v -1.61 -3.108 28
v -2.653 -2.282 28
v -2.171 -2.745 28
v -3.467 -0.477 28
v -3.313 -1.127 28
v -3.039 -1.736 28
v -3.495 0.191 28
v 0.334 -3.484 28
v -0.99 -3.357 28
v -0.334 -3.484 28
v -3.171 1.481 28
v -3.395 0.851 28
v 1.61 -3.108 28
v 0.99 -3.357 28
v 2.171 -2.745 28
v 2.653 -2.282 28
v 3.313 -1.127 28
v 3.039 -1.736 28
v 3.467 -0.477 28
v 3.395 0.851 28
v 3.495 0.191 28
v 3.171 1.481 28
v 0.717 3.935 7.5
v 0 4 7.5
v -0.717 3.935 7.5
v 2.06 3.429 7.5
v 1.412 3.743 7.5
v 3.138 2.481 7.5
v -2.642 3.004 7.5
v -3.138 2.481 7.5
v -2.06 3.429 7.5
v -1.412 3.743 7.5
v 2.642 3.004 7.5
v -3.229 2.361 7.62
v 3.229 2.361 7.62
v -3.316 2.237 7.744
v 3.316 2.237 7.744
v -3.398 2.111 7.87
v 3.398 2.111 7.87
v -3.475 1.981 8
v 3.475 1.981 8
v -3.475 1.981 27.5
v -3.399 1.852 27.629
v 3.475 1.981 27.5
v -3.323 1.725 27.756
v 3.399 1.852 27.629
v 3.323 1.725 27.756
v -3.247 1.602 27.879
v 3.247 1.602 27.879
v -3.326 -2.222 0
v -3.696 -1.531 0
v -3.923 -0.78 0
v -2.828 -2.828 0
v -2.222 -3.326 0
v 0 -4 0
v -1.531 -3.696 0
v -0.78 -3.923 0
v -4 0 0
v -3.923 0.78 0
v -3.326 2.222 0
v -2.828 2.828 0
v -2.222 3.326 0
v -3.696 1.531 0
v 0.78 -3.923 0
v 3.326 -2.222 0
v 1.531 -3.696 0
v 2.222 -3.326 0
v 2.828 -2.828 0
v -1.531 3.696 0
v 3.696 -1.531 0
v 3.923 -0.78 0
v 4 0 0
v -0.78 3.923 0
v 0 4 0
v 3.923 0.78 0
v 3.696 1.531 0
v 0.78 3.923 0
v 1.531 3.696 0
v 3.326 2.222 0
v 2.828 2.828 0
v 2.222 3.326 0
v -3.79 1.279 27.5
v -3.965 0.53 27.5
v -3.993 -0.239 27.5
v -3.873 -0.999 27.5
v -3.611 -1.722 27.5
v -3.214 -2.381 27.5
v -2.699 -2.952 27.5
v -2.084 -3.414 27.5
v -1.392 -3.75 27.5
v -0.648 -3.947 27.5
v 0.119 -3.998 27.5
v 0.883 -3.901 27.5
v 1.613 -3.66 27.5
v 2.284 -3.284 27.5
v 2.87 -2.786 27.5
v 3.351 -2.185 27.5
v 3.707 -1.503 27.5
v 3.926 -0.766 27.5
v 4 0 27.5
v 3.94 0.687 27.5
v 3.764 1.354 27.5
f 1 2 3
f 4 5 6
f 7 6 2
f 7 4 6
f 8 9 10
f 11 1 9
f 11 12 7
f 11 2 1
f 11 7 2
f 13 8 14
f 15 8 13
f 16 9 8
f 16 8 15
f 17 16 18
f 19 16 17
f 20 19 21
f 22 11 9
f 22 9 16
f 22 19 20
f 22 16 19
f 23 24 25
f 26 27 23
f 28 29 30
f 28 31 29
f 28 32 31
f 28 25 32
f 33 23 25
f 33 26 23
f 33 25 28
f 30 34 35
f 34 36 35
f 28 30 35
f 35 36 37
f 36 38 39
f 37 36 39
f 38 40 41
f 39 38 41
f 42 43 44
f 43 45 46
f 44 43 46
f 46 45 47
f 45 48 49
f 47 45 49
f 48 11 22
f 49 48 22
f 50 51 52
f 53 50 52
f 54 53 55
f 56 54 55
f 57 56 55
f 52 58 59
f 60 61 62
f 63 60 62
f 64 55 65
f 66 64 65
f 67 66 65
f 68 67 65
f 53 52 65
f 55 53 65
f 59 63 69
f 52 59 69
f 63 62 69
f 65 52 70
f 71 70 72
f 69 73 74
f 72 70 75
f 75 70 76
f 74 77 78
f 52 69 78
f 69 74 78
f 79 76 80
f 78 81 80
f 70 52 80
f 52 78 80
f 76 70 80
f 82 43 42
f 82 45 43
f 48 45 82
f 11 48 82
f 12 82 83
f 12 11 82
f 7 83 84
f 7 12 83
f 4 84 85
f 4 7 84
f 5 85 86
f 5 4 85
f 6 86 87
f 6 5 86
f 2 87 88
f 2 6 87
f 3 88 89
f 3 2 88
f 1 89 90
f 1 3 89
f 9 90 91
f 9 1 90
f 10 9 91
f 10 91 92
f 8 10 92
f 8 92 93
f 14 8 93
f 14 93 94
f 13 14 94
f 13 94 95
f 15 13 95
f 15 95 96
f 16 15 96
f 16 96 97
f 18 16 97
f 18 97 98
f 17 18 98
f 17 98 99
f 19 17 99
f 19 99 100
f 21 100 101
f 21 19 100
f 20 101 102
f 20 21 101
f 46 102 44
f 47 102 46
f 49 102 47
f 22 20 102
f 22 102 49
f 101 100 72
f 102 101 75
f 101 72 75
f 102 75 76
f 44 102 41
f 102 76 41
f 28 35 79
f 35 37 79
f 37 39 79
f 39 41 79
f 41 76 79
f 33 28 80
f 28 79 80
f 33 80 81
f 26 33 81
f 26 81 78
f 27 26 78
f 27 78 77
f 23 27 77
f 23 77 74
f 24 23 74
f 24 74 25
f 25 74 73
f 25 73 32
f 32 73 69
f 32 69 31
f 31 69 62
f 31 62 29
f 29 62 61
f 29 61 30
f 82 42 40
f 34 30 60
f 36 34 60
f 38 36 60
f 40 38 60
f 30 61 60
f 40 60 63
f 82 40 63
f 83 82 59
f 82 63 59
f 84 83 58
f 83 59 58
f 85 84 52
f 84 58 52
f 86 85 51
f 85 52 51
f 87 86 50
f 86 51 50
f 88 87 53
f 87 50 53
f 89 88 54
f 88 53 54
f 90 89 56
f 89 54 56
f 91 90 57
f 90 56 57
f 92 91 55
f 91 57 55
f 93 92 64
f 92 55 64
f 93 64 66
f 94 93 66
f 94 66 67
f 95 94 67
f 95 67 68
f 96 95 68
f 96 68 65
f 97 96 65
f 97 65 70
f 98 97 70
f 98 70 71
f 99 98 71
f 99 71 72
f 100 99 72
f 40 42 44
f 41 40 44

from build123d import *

# Parameters (mm, degrees)
SKETCH2_R           = 4
BOSS_EXTRUDE1_DEPTH = 28
CUT_EXTRUDE1_DEPTH  = 20.5
CHAMFER2_SIZE       = 0.5


with BuildPart() as part:
    # Sketch2 → Boss-Extrude1 (new body)
    with BuildSketch(Plane.XY):
        Circle(SKETCH2_R)
    extrude(amount=BOSS_EXTRUDE1_DEPTH)

    # Sketch4 → Cut-Extrude1 (cut)
    with BuildSketch(Plane.XY.offset(28)):
        Polygon((-3.475, 1.981003534), (3.475, 1.981003534), (3.475, 4), (0, 4), (-3.475, 4), align=None)
    extrude(amount=-CUT_EXTRUDE1_DEPTH, mode=Mode.SUBTRACT)

    # Chamfer2
    chamfer2_edges = [part.edges().sort_by_distance(p)[0] for p in [
        (0, 1.981003534, 7.5),
        (-1.024695077, -3.866522986, 28),
        (0, 1.981003534, 28),
    ]]
    chamfer(chamfer2_edges, length=CHAMFER2_SIZE)


solid = part.part
